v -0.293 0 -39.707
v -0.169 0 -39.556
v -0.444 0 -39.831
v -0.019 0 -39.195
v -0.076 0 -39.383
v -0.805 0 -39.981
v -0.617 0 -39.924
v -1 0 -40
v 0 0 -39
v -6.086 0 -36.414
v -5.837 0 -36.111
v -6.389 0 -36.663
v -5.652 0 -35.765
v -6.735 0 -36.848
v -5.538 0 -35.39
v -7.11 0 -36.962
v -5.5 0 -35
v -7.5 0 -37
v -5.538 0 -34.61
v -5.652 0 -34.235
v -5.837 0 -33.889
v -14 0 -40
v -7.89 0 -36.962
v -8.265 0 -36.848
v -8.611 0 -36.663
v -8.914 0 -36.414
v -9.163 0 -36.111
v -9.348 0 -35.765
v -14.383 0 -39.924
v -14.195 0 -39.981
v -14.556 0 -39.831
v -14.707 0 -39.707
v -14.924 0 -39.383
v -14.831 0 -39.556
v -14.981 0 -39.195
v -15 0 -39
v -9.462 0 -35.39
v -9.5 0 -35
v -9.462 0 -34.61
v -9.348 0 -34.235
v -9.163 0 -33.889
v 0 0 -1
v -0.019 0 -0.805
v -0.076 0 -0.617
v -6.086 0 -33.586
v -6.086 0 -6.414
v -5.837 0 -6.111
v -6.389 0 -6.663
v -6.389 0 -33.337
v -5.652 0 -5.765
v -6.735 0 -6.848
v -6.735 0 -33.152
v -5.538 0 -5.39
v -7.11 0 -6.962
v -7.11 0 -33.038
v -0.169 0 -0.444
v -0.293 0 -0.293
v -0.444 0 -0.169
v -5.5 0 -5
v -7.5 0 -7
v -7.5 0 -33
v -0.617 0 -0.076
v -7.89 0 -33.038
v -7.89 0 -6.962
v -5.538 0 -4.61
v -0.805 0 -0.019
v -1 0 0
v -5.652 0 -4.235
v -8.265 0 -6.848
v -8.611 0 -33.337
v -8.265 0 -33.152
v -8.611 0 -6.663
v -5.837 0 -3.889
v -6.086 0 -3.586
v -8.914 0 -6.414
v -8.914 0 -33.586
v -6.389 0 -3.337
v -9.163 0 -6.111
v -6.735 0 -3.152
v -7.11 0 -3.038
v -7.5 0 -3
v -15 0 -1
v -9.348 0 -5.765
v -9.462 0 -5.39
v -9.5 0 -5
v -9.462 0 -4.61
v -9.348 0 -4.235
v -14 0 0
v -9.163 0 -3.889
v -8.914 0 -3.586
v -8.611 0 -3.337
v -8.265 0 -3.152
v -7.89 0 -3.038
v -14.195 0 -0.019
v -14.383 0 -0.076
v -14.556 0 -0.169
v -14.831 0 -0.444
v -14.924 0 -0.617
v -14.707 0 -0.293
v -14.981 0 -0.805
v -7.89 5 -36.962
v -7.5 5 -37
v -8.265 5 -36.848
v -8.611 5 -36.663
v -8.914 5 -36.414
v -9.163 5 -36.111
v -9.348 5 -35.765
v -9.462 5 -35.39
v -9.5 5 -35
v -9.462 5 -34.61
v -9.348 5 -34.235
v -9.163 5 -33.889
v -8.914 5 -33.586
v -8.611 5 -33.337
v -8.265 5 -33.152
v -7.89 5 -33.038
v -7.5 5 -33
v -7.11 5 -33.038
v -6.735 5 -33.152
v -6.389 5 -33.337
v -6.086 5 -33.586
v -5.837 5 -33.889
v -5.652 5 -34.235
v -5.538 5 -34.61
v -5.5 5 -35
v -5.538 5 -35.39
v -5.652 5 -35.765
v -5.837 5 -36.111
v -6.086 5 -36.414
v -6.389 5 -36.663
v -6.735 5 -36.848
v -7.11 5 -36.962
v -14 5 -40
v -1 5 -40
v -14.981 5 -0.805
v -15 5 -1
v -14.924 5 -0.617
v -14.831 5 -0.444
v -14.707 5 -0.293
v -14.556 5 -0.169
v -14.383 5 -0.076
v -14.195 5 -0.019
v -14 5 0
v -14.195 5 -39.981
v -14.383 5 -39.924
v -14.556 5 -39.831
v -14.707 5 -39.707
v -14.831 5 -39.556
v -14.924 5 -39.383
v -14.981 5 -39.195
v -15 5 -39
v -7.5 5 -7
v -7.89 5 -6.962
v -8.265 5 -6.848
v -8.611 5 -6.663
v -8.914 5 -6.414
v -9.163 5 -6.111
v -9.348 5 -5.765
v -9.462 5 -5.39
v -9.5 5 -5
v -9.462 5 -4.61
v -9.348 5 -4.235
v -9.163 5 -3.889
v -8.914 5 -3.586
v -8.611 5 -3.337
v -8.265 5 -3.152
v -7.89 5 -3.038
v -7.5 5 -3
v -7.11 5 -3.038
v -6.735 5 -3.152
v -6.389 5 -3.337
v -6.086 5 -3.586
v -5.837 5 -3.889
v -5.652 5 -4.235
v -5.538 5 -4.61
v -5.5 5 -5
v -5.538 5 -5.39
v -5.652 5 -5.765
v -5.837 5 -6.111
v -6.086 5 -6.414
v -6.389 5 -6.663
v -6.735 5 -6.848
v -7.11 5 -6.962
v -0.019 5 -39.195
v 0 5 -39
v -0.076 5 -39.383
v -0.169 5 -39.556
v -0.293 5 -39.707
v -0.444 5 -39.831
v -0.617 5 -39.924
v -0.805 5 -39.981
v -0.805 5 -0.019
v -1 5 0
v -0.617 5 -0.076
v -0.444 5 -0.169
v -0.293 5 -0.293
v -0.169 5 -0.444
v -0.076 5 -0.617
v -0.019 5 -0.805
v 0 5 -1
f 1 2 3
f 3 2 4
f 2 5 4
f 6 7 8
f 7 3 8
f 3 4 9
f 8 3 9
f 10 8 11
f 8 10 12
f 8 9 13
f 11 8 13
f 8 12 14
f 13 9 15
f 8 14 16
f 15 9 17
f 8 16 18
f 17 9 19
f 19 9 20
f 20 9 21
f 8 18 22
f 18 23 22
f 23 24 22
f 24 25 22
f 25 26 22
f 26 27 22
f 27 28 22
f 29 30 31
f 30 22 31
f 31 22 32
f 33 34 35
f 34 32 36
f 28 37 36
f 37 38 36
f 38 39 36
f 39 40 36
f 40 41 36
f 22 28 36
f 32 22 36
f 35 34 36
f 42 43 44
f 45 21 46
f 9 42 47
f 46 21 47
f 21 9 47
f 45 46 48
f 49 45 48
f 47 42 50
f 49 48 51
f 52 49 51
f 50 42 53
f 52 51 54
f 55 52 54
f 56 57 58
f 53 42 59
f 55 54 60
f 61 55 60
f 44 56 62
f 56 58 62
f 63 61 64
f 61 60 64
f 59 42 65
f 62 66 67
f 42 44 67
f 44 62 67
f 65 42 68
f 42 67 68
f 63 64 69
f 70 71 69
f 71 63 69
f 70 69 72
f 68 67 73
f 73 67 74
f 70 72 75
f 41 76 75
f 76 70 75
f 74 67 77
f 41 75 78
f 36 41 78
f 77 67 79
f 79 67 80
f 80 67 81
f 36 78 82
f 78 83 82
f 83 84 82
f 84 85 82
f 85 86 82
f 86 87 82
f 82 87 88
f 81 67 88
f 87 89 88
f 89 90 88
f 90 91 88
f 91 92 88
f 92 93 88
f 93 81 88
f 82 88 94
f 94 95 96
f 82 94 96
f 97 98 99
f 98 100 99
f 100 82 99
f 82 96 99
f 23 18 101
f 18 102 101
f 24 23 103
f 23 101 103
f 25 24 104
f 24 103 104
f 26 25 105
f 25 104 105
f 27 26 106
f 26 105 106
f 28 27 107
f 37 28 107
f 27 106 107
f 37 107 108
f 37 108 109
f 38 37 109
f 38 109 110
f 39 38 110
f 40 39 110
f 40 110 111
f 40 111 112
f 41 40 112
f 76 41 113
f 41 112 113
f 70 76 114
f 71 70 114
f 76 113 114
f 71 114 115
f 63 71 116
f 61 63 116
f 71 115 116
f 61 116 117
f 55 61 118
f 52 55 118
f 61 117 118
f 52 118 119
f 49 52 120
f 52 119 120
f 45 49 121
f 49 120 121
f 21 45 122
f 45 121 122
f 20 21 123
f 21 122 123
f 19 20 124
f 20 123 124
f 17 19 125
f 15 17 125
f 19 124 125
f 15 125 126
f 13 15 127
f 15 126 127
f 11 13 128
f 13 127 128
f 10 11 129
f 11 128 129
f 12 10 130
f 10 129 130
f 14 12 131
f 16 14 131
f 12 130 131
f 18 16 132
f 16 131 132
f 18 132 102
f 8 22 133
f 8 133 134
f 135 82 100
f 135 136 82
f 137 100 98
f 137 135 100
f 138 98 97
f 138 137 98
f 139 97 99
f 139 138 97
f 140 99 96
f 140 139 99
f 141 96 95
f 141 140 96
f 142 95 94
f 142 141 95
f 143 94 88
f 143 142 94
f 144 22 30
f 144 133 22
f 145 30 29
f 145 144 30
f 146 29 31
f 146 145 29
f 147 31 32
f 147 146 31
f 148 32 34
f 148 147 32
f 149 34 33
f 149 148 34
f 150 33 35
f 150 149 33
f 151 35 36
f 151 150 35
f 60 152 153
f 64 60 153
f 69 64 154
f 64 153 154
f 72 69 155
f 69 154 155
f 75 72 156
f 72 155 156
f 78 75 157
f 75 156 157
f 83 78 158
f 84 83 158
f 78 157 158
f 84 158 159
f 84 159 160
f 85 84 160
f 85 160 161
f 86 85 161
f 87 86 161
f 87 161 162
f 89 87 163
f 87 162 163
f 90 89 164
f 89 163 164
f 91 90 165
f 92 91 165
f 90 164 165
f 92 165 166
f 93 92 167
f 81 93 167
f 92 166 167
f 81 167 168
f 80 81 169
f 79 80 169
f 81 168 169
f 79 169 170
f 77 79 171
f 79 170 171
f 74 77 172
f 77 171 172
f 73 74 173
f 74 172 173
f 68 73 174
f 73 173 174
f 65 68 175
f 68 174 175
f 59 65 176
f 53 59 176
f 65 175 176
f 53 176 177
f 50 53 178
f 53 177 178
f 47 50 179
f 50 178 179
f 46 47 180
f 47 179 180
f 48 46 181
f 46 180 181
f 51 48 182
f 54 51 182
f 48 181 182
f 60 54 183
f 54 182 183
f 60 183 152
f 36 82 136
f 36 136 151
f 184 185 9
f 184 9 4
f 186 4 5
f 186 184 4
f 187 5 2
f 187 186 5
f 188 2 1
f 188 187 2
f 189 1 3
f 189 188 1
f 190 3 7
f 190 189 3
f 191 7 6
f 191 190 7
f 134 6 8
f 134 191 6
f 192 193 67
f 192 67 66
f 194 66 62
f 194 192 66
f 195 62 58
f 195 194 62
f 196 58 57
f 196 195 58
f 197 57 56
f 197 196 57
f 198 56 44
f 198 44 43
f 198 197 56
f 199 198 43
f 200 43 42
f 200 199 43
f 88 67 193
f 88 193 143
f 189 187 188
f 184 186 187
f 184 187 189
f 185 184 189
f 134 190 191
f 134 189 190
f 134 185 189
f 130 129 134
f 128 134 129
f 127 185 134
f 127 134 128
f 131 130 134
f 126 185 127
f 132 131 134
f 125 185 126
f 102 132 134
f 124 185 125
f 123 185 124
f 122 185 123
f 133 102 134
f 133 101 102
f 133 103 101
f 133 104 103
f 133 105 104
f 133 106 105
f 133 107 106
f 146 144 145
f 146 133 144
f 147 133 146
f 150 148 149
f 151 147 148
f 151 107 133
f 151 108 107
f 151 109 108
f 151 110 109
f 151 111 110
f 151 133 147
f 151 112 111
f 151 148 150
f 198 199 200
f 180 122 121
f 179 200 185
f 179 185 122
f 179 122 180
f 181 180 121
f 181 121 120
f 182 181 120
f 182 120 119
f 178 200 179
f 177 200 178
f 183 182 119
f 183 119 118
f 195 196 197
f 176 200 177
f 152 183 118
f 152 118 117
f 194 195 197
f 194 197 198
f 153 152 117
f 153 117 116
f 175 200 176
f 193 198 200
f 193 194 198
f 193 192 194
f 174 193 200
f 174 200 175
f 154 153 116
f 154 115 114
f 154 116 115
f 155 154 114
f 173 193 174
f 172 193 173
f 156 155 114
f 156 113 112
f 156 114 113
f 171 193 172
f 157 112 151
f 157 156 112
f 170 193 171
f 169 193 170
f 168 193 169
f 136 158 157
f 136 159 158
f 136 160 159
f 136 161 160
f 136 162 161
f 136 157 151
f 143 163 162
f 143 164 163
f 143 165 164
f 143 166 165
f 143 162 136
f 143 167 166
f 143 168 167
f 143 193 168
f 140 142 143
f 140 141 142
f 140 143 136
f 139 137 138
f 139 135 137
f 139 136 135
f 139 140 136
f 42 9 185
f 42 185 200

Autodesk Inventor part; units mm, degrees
ref_plane "YZ Plane" through (0, 0, 0) normal (1, 0, 0) x (0, 1, 0)
ref_plane "XZ Plane" through (0, 0, 0) normal (0, 1, 0) x (-1, 0, 0)
ref_plane "XY Plane" through (0, 0, 0) normal (0, 0, 1) x (1, 0, 0)
sketch "Skizze1" plane through (0, 0, 0) normal (0, 1, 0) x (-1, 0, 0)
  line L0 (0, 0) -> (15, 0)
  line L1 (15, 0) -> (15, -40)
  line L2 (15, -40) -> (0, -40)
  line L3 (0, -40) -> (0, 0)
  dimension "d0" = 15
  dimension "d1" = 40
extrude "Extrusion1" add sketch "Skizze1" along normal blind 5
fillet "Rundung1" radius 1 4 edges at (-15, 2.5, 0) (0, 2.5, 0) (0, 2.5, -40) (-15, 2.5, -40)
sketch "Skizze2" plane through (0, 0, 0) normal (0, -1, 0) x (1, 0, 0)
  line L0 (-1, 0) -> (-14, 0) projected
  line L1 (0, -39) -> (0, -1) projected
  line L2 (-14, -40) -> (-1, -40) projected
  point P0 (0, 0)
  point P1 (-7.5, -5)
  point P2 (-7.5, -35)
  dimension "d5" = 5
  dimension "d6" = 5
  dimension "d7" = 7.5
  dimension "d8" = 7.5
  dimension "d9" = 30
hole "Bohrung1" at (-7.5, 0, -5) at (-7.5, 0, -35) direction (0, 1, 0) diameter 4 end through all
sketch "Skizze3" plane through (0, 0, 0) normal (0, -1, 0) x (1, 0, 0)
  line L0 (-1, 0) -> (-14, 0) projected
  line L1 (0, -39) -> (0, -1) projected
  point P0 (0, 0)
  point P1 (-7.5, -20)
  dimension "d17" = 20
  dimension "d18" = 7.5
properties part number "halter_test"
